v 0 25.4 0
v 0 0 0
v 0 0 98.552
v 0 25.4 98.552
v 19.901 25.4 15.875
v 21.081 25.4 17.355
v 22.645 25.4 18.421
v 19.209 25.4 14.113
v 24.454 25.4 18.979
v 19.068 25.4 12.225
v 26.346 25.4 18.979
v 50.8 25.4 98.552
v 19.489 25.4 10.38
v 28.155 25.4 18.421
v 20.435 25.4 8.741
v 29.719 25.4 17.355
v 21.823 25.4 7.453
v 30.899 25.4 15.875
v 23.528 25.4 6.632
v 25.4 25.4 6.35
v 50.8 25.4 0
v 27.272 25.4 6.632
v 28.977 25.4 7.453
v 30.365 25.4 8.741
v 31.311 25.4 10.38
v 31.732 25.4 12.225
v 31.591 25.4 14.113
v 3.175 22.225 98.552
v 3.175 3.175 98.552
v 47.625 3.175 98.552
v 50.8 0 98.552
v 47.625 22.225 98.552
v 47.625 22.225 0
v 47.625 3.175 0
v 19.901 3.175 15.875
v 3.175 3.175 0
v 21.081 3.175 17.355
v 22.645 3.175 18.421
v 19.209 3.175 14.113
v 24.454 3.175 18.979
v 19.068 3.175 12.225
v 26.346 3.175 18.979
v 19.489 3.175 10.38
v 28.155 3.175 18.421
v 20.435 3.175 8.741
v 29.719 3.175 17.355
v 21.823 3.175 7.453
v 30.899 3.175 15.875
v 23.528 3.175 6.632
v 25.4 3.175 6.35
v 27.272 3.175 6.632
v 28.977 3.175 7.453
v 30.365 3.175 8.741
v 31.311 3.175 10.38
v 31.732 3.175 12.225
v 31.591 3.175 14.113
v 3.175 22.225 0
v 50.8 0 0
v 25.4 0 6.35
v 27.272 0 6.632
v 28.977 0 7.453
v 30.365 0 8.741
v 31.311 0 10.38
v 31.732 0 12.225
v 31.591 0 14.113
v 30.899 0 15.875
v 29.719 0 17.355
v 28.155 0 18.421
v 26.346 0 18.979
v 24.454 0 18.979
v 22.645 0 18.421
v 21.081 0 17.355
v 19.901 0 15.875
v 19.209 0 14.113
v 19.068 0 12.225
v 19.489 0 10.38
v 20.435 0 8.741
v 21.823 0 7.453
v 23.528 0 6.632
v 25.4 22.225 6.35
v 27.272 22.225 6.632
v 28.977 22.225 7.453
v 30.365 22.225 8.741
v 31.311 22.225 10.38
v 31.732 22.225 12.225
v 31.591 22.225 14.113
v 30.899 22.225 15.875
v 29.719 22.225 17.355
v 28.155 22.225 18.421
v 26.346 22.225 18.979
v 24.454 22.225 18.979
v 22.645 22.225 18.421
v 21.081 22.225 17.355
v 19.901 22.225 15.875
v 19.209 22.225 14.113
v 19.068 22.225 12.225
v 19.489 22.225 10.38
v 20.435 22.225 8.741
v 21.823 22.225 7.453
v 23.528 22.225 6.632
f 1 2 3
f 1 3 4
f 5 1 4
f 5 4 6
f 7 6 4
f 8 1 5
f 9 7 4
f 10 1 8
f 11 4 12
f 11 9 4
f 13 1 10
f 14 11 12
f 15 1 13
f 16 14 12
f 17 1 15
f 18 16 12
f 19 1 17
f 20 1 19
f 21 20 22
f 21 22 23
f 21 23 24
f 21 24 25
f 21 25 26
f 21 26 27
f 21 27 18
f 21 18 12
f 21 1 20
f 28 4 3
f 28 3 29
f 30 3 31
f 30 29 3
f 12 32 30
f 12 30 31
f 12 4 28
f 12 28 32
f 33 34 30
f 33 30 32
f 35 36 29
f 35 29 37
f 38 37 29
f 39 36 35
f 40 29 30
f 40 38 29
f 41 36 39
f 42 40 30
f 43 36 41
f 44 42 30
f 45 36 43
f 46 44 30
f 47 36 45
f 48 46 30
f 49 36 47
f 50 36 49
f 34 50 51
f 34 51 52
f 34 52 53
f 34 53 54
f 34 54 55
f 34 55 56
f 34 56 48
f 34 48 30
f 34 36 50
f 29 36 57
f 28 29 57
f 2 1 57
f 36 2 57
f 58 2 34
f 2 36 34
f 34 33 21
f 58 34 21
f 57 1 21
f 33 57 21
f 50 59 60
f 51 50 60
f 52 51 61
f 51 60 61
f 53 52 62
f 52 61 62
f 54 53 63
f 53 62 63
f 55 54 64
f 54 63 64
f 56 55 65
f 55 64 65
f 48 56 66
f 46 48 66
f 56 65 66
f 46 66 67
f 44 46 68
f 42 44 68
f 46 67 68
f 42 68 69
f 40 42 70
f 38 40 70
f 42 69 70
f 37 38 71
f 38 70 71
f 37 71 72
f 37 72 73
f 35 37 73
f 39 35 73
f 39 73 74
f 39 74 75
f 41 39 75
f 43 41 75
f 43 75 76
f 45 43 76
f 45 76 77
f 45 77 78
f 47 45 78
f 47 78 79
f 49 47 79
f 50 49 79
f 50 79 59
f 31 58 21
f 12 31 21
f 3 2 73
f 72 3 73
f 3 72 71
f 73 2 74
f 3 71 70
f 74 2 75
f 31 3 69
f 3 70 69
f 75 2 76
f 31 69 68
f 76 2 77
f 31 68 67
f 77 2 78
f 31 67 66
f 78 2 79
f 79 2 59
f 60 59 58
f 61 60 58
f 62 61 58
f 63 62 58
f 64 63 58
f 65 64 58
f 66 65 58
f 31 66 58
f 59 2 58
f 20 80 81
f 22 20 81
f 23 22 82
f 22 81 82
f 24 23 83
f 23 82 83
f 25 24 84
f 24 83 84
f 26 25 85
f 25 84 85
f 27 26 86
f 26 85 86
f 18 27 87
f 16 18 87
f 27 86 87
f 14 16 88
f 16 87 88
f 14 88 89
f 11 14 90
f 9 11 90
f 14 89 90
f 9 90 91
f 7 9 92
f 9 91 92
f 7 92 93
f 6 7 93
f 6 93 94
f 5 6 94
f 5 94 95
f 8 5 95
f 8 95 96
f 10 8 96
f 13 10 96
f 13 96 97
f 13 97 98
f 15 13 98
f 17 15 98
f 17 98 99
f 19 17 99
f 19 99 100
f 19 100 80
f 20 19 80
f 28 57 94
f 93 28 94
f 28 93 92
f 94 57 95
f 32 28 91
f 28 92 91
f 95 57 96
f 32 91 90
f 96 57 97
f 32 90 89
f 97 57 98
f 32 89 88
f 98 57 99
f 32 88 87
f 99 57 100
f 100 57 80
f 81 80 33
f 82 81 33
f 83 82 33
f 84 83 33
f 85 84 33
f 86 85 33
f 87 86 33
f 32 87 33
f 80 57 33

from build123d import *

# Parameters (mm, degrees)
SKETCH1_W           = 50.8
SKETCH1_H           = 25.4
SKETCH1_W_2         = 44.45
SKETCH1_H_2         = 19.05
BOSS_EXTRUDE1_DEPTH = 98.552
SKETCH2_R           = 6.35
CUT_EXTRUDE1_DEPTH  = 114.746633814


with BuildPart() as part:
    # Sketch1 → Boss-Extrude1 (new body)
    with BuildSketch(Plane.XY):
        with Locations((25.4, 12.7)):
            Rectangle(SKETCH1_W, SKETCH1_H)
        with Locations((25.4, 12.7)):
            Rectangle(SKETCH1_W_2, SKETCH1_H_2, mode=Mode.SUBTRACT)
    extrude(amount=BOSS_EXTRUDE1_DEPTH)

    # Sketch2 → Cut-Extrude1 (cut, through all)
    with BuildSketch(Plane.XZ):
        with Locations(Location((25.4, 12.7, 0), (0, 0, 270))):
            Circle(SKETCH2_R)
    extrude(amount=-CUT_EXTRUDE1_DEPTH, mode=Mode.SUBTRACT)


solid = part.part
